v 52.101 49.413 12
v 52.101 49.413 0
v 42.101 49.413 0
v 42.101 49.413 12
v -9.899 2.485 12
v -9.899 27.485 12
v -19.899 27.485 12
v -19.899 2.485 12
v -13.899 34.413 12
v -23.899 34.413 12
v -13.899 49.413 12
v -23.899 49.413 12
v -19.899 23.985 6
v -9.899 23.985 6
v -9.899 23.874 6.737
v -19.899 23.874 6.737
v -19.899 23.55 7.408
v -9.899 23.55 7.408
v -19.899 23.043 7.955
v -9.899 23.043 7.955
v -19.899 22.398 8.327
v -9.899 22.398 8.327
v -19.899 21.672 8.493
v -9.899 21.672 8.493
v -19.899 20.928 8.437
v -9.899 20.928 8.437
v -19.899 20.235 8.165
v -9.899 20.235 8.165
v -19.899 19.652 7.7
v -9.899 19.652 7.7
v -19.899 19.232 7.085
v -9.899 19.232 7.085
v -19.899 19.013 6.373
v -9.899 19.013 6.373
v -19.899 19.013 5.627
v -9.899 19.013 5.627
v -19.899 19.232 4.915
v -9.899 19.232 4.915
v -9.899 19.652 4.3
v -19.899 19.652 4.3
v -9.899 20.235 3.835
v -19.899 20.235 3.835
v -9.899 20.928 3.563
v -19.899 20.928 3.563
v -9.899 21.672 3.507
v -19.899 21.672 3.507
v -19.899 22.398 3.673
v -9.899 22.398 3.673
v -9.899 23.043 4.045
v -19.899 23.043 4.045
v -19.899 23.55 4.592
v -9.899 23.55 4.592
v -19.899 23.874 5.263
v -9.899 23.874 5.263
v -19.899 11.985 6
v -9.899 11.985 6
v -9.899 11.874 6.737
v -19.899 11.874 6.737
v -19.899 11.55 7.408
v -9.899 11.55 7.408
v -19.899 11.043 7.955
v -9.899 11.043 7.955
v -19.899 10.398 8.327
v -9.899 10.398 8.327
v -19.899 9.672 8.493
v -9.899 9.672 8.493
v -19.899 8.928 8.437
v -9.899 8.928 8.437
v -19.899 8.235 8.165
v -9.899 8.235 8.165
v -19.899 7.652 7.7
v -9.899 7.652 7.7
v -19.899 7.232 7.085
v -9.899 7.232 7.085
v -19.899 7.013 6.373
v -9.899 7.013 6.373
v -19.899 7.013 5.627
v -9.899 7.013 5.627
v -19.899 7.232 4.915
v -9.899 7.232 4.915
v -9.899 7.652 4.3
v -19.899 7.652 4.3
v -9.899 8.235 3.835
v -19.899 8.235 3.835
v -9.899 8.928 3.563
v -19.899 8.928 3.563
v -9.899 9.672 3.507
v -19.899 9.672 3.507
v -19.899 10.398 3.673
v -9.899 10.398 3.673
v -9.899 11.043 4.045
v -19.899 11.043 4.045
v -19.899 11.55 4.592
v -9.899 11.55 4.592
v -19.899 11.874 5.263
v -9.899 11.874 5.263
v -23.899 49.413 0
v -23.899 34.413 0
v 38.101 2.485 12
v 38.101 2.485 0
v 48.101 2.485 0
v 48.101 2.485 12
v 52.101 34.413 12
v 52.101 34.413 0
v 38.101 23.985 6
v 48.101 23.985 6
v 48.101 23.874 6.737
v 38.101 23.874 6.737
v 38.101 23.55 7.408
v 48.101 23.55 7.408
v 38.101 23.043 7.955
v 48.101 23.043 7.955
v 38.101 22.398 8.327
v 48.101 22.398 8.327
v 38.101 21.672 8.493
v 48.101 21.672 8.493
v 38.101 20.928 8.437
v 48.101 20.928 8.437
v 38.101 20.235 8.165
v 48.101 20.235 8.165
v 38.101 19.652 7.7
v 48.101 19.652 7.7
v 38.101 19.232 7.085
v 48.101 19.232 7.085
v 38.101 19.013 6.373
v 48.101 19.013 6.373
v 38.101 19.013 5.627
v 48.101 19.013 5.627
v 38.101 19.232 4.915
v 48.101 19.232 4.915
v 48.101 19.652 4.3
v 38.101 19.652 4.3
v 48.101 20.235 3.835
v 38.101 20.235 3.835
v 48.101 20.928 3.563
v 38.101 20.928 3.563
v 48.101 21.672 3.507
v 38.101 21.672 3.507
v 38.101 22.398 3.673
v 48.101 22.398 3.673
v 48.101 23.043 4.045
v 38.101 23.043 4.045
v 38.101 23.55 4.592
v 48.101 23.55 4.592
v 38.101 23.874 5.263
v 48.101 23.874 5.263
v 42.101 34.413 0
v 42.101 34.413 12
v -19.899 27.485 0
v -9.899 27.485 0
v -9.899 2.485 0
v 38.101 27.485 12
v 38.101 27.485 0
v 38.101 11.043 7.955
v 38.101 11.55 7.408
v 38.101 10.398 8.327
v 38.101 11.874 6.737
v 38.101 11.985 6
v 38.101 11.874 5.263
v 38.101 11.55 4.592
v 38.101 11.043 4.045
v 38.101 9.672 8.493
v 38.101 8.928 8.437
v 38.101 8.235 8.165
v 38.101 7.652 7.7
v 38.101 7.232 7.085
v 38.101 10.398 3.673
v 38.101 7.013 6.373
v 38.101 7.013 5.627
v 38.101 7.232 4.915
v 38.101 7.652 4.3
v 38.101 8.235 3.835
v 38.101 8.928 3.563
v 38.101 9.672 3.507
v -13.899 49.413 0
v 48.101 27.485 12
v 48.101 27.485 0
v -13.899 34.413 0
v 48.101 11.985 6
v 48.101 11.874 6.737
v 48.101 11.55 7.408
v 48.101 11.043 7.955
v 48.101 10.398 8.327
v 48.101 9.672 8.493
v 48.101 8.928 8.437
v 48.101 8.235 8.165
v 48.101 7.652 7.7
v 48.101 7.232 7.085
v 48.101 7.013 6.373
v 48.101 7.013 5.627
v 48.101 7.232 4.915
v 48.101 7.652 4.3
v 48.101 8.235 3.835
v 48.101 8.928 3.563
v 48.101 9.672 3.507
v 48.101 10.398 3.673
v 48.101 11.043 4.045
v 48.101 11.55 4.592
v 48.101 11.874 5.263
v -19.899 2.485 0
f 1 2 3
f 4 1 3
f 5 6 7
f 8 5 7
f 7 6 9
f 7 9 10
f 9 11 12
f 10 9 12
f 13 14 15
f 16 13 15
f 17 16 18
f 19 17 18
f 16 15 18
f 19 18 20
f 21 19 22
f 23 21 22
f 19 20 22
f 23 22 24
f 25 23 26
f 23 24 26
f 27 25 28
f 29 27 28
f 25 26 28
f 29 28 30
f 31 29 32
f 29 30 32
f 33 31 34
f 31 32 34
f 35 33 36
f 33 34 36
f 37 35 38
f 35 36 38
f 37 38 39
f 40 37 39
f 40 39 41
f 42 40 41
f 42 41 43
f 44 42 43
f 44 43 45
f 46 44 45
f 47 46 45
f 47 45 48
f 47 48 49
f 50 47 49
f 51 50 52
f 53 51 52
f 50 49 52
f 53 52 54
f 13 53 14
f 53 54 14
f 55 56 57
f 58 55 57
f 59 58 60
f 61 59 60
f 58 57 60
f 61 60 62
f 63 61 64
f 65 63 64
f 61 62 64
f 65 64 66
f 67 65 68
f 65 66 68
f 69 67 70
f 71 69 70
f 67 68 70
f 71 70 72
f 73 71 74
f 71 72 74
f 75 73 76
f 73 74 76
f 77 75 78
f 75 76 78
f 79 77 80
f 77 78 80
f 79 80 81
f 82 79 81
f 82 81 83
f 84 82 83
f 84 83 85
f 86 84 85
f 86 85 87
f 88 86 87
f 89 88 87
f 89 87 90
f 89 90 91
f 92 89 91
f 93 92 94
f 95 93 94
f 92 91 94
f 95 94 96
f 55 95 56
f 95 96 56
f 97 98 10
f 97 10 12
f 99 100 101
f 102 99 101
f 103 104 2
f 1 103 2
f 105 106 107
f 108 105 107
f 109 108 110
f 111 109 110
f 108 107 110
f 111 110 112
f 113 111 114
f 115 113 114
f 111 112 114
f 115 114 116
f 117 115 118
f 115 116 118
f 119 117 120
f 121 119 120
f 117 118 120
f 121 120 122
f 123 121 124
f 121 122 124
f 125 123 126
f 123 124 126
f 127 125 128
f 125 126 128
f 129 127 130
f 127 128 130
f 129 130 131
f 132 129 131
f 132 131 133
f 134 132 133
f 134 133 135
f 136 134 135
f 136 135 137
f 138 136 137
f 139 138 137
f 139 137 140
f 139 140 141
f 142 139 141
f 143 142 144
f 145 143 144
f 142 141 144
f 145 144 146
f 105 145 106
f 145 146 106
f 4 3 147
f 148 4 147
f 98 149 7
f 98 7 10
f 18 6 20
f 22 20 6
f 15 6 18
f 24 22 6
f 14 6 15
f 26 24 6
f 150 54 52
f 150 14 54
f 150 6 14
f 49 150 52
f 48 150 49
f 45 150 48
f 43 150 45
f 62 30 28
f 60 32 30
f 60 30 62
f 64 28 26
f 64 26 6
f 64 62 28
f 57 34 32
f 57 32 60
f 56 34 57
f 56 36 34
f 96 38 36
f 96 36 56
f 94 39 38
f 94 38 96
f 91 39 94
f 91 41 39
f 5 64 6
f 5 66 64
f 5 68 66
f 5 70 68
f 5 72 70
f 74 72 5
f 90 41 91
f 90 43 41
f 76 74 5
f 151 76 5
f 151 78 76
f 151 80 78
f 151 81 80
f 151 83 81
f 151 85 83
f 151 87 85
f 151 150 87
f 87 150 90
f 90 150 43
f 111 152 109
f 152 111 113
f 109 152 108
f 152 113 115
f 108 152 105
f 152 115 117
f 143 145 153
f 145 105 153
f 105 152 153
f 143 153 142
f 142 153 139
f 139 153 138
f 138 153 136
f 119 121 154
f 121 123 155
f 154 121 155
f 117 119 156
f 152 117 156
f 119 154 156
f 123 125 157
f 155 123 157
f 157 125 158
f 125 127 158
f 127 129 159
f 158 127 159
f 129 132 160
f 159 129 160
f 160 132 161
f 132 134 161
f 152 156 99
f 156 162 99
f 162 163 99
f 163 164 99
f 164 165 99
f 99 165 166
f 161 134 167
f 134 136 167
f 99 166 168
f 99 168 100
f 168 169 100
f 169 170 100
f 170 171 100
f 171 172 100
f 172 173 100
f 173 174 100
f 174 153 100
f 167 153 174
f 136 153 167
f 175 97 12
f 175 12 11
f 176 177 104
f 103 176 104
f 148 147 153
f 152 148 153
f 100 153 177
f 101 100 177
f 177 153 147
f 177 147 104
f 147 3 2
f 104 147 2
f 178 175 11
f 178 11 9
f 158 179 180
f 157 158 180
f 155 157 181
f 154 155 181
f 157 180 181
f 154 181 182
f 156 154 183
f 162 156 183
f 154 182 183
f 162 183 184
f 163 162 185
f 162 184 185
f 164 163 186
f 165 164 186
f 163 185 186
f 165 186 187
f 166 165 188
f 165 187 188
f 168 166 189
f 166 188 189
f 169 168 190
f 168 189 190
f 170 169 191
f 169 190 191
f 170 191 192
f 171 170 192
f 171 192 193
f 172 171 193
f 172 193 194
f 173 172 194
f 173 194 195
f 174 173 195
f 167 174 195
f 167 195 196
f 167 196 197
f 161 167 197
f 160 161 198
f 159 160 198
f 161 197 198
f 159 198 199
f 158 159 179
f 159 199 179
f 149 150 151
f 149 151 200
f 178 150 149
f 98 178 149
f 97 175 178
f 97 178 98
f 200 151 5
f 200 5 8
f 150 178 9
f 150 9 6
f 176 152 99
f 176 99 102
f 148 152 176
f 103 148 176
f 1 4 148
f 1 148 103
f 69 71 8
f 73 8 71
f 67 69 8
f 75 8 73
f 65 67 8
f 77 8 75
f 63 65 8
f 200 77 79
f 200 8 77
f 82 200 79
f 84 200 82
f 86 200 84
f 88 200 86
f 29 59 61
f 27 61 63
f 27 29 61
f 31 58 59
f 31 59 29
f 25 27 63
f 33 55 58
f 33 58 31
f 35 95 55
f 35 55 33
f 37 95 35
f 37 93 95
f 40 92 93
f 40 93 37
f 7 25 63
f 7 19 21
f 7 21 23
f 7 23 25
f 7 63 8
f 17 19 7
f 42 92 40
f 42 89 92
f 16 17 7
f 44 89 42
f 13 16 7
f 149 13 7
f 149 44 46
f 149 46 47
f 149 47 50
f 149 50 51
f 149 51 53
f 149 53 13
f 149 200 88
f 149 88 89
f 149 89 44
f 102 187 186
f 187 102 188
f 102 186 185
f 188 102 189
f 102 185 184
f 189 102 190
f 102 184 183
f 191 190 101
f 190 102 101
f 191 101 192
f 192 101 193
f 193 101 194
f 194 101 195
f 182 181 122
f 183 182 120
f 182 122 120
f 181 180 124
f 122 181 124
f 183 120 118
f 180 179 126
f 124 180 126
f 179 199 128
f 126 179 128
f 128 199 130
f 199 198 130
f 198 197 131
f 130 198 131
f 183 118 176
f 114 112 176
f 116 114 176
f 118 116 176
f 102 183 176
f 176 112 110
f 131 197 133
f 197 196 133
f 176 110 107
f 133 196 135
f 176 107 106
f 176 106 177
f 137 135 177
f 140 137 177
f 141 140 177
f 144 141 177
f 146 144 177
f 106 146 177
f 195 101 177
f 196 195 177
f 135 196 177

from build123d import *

# Parameters (mm, degrees)
EXTRUDE_1_DEPTH     = 12
EXTRUDE_2_DEPTH     = 12
SKETCH_3_R          = 2.5
CUT_EXTRUDE_1_DEPTH = 10
SKETCH_3_3_R        = 2.5
CUT_EXTRUDE_2_DEPTH = 10
SKETCH_6_R          = 2.5
CUT_EXTRUDE_3_DEPTH = 10


with BuildPart() as part:
    # 草图1 → 凸台-拉伸1 (new body)
    with BuildSketch(Plane.XY):
        Polygon((42.101381637, 34.412975584), (38.101381637, 27.484772353), (38.101381637, 2.484772353), (48.101381637, 2.484772353), (48.101381637, 27.484772353), (52.101381637, 34.412975584), (52.101381637, 49.412975584), (42.101381637, 49.412975584), align=None)
    extrude(amount=EXTRUDE_1_DEPTH)

    # 草图6 → 切除-拉伸3 (cut)
    with BuildSketch(Plane(origin=(48.101381637, 0, 0), x_dir=(0, 0, -1), z_dir=(1, 0, 0))):
        with Locations(Location((-6, 21.484772353, 0), (0, 0, 90))):
            Circle(SKETCH_6_R)
        with Locations(Location((-6, 9.484772353, 0), (0, 0, 90))):
            Circle(SKETCH_6_R)
    extrude(amount=-CUT_EXTRUDE_3_DEPTH, mode=Mode.SUBTRACT)


with BuildPart() as body_2:
    # 草图1<3> → 凸台-拉伸2 (new body)
    with BuildSketch(Plane.XY):
        Polygon((-13.898618363, 34.412975584), (-9.898618363, 27.484772353), (-9.898618363, 2.484772353), (-19.898618363, 2.484772353), (-19.898618363, 27.484772353), (-23.898618363, 34.412975584), (-23.898618363, 49.412975584), (-13.898618363, 49.412975584), align=None)
    extrude(amount=EXTRUDE_2_DEPTH)

    # 草图3 → 切除-拉伸1 (cut)
    with BuildSketch(Plane(origin=(-9.898618363, 0, 0), x_dir=(0, 0, -1), z_dir=(1, 0, 0))):
        with Locations(Location((-6, 21.484772353, 0), (0, 0, 90))):
            Circle(SKETCH_3_R)
    extrude(amount=-CUT_EXTRUDE_1_DEPTH, mode=Mode.SUBTRACT)

    # 草图3<3> → 切除-拉伸2 (cut)
    with BuildSketch(Plane(origin=(-9.898618363, 0, 0), x_dir=(0, 0, -1), z_dir=(1, 0, 0))):
        with Locations(Location((-6, 9.484772353, 0), (0, 0, 90))):
            Circle(SKETCH_3_3_R)
    extrude(amount=-CUT_EXTRUDE_2_DEPTH, mode=Mode.SUBTRACT)


solid = Compound([part.part, body_2.part])
